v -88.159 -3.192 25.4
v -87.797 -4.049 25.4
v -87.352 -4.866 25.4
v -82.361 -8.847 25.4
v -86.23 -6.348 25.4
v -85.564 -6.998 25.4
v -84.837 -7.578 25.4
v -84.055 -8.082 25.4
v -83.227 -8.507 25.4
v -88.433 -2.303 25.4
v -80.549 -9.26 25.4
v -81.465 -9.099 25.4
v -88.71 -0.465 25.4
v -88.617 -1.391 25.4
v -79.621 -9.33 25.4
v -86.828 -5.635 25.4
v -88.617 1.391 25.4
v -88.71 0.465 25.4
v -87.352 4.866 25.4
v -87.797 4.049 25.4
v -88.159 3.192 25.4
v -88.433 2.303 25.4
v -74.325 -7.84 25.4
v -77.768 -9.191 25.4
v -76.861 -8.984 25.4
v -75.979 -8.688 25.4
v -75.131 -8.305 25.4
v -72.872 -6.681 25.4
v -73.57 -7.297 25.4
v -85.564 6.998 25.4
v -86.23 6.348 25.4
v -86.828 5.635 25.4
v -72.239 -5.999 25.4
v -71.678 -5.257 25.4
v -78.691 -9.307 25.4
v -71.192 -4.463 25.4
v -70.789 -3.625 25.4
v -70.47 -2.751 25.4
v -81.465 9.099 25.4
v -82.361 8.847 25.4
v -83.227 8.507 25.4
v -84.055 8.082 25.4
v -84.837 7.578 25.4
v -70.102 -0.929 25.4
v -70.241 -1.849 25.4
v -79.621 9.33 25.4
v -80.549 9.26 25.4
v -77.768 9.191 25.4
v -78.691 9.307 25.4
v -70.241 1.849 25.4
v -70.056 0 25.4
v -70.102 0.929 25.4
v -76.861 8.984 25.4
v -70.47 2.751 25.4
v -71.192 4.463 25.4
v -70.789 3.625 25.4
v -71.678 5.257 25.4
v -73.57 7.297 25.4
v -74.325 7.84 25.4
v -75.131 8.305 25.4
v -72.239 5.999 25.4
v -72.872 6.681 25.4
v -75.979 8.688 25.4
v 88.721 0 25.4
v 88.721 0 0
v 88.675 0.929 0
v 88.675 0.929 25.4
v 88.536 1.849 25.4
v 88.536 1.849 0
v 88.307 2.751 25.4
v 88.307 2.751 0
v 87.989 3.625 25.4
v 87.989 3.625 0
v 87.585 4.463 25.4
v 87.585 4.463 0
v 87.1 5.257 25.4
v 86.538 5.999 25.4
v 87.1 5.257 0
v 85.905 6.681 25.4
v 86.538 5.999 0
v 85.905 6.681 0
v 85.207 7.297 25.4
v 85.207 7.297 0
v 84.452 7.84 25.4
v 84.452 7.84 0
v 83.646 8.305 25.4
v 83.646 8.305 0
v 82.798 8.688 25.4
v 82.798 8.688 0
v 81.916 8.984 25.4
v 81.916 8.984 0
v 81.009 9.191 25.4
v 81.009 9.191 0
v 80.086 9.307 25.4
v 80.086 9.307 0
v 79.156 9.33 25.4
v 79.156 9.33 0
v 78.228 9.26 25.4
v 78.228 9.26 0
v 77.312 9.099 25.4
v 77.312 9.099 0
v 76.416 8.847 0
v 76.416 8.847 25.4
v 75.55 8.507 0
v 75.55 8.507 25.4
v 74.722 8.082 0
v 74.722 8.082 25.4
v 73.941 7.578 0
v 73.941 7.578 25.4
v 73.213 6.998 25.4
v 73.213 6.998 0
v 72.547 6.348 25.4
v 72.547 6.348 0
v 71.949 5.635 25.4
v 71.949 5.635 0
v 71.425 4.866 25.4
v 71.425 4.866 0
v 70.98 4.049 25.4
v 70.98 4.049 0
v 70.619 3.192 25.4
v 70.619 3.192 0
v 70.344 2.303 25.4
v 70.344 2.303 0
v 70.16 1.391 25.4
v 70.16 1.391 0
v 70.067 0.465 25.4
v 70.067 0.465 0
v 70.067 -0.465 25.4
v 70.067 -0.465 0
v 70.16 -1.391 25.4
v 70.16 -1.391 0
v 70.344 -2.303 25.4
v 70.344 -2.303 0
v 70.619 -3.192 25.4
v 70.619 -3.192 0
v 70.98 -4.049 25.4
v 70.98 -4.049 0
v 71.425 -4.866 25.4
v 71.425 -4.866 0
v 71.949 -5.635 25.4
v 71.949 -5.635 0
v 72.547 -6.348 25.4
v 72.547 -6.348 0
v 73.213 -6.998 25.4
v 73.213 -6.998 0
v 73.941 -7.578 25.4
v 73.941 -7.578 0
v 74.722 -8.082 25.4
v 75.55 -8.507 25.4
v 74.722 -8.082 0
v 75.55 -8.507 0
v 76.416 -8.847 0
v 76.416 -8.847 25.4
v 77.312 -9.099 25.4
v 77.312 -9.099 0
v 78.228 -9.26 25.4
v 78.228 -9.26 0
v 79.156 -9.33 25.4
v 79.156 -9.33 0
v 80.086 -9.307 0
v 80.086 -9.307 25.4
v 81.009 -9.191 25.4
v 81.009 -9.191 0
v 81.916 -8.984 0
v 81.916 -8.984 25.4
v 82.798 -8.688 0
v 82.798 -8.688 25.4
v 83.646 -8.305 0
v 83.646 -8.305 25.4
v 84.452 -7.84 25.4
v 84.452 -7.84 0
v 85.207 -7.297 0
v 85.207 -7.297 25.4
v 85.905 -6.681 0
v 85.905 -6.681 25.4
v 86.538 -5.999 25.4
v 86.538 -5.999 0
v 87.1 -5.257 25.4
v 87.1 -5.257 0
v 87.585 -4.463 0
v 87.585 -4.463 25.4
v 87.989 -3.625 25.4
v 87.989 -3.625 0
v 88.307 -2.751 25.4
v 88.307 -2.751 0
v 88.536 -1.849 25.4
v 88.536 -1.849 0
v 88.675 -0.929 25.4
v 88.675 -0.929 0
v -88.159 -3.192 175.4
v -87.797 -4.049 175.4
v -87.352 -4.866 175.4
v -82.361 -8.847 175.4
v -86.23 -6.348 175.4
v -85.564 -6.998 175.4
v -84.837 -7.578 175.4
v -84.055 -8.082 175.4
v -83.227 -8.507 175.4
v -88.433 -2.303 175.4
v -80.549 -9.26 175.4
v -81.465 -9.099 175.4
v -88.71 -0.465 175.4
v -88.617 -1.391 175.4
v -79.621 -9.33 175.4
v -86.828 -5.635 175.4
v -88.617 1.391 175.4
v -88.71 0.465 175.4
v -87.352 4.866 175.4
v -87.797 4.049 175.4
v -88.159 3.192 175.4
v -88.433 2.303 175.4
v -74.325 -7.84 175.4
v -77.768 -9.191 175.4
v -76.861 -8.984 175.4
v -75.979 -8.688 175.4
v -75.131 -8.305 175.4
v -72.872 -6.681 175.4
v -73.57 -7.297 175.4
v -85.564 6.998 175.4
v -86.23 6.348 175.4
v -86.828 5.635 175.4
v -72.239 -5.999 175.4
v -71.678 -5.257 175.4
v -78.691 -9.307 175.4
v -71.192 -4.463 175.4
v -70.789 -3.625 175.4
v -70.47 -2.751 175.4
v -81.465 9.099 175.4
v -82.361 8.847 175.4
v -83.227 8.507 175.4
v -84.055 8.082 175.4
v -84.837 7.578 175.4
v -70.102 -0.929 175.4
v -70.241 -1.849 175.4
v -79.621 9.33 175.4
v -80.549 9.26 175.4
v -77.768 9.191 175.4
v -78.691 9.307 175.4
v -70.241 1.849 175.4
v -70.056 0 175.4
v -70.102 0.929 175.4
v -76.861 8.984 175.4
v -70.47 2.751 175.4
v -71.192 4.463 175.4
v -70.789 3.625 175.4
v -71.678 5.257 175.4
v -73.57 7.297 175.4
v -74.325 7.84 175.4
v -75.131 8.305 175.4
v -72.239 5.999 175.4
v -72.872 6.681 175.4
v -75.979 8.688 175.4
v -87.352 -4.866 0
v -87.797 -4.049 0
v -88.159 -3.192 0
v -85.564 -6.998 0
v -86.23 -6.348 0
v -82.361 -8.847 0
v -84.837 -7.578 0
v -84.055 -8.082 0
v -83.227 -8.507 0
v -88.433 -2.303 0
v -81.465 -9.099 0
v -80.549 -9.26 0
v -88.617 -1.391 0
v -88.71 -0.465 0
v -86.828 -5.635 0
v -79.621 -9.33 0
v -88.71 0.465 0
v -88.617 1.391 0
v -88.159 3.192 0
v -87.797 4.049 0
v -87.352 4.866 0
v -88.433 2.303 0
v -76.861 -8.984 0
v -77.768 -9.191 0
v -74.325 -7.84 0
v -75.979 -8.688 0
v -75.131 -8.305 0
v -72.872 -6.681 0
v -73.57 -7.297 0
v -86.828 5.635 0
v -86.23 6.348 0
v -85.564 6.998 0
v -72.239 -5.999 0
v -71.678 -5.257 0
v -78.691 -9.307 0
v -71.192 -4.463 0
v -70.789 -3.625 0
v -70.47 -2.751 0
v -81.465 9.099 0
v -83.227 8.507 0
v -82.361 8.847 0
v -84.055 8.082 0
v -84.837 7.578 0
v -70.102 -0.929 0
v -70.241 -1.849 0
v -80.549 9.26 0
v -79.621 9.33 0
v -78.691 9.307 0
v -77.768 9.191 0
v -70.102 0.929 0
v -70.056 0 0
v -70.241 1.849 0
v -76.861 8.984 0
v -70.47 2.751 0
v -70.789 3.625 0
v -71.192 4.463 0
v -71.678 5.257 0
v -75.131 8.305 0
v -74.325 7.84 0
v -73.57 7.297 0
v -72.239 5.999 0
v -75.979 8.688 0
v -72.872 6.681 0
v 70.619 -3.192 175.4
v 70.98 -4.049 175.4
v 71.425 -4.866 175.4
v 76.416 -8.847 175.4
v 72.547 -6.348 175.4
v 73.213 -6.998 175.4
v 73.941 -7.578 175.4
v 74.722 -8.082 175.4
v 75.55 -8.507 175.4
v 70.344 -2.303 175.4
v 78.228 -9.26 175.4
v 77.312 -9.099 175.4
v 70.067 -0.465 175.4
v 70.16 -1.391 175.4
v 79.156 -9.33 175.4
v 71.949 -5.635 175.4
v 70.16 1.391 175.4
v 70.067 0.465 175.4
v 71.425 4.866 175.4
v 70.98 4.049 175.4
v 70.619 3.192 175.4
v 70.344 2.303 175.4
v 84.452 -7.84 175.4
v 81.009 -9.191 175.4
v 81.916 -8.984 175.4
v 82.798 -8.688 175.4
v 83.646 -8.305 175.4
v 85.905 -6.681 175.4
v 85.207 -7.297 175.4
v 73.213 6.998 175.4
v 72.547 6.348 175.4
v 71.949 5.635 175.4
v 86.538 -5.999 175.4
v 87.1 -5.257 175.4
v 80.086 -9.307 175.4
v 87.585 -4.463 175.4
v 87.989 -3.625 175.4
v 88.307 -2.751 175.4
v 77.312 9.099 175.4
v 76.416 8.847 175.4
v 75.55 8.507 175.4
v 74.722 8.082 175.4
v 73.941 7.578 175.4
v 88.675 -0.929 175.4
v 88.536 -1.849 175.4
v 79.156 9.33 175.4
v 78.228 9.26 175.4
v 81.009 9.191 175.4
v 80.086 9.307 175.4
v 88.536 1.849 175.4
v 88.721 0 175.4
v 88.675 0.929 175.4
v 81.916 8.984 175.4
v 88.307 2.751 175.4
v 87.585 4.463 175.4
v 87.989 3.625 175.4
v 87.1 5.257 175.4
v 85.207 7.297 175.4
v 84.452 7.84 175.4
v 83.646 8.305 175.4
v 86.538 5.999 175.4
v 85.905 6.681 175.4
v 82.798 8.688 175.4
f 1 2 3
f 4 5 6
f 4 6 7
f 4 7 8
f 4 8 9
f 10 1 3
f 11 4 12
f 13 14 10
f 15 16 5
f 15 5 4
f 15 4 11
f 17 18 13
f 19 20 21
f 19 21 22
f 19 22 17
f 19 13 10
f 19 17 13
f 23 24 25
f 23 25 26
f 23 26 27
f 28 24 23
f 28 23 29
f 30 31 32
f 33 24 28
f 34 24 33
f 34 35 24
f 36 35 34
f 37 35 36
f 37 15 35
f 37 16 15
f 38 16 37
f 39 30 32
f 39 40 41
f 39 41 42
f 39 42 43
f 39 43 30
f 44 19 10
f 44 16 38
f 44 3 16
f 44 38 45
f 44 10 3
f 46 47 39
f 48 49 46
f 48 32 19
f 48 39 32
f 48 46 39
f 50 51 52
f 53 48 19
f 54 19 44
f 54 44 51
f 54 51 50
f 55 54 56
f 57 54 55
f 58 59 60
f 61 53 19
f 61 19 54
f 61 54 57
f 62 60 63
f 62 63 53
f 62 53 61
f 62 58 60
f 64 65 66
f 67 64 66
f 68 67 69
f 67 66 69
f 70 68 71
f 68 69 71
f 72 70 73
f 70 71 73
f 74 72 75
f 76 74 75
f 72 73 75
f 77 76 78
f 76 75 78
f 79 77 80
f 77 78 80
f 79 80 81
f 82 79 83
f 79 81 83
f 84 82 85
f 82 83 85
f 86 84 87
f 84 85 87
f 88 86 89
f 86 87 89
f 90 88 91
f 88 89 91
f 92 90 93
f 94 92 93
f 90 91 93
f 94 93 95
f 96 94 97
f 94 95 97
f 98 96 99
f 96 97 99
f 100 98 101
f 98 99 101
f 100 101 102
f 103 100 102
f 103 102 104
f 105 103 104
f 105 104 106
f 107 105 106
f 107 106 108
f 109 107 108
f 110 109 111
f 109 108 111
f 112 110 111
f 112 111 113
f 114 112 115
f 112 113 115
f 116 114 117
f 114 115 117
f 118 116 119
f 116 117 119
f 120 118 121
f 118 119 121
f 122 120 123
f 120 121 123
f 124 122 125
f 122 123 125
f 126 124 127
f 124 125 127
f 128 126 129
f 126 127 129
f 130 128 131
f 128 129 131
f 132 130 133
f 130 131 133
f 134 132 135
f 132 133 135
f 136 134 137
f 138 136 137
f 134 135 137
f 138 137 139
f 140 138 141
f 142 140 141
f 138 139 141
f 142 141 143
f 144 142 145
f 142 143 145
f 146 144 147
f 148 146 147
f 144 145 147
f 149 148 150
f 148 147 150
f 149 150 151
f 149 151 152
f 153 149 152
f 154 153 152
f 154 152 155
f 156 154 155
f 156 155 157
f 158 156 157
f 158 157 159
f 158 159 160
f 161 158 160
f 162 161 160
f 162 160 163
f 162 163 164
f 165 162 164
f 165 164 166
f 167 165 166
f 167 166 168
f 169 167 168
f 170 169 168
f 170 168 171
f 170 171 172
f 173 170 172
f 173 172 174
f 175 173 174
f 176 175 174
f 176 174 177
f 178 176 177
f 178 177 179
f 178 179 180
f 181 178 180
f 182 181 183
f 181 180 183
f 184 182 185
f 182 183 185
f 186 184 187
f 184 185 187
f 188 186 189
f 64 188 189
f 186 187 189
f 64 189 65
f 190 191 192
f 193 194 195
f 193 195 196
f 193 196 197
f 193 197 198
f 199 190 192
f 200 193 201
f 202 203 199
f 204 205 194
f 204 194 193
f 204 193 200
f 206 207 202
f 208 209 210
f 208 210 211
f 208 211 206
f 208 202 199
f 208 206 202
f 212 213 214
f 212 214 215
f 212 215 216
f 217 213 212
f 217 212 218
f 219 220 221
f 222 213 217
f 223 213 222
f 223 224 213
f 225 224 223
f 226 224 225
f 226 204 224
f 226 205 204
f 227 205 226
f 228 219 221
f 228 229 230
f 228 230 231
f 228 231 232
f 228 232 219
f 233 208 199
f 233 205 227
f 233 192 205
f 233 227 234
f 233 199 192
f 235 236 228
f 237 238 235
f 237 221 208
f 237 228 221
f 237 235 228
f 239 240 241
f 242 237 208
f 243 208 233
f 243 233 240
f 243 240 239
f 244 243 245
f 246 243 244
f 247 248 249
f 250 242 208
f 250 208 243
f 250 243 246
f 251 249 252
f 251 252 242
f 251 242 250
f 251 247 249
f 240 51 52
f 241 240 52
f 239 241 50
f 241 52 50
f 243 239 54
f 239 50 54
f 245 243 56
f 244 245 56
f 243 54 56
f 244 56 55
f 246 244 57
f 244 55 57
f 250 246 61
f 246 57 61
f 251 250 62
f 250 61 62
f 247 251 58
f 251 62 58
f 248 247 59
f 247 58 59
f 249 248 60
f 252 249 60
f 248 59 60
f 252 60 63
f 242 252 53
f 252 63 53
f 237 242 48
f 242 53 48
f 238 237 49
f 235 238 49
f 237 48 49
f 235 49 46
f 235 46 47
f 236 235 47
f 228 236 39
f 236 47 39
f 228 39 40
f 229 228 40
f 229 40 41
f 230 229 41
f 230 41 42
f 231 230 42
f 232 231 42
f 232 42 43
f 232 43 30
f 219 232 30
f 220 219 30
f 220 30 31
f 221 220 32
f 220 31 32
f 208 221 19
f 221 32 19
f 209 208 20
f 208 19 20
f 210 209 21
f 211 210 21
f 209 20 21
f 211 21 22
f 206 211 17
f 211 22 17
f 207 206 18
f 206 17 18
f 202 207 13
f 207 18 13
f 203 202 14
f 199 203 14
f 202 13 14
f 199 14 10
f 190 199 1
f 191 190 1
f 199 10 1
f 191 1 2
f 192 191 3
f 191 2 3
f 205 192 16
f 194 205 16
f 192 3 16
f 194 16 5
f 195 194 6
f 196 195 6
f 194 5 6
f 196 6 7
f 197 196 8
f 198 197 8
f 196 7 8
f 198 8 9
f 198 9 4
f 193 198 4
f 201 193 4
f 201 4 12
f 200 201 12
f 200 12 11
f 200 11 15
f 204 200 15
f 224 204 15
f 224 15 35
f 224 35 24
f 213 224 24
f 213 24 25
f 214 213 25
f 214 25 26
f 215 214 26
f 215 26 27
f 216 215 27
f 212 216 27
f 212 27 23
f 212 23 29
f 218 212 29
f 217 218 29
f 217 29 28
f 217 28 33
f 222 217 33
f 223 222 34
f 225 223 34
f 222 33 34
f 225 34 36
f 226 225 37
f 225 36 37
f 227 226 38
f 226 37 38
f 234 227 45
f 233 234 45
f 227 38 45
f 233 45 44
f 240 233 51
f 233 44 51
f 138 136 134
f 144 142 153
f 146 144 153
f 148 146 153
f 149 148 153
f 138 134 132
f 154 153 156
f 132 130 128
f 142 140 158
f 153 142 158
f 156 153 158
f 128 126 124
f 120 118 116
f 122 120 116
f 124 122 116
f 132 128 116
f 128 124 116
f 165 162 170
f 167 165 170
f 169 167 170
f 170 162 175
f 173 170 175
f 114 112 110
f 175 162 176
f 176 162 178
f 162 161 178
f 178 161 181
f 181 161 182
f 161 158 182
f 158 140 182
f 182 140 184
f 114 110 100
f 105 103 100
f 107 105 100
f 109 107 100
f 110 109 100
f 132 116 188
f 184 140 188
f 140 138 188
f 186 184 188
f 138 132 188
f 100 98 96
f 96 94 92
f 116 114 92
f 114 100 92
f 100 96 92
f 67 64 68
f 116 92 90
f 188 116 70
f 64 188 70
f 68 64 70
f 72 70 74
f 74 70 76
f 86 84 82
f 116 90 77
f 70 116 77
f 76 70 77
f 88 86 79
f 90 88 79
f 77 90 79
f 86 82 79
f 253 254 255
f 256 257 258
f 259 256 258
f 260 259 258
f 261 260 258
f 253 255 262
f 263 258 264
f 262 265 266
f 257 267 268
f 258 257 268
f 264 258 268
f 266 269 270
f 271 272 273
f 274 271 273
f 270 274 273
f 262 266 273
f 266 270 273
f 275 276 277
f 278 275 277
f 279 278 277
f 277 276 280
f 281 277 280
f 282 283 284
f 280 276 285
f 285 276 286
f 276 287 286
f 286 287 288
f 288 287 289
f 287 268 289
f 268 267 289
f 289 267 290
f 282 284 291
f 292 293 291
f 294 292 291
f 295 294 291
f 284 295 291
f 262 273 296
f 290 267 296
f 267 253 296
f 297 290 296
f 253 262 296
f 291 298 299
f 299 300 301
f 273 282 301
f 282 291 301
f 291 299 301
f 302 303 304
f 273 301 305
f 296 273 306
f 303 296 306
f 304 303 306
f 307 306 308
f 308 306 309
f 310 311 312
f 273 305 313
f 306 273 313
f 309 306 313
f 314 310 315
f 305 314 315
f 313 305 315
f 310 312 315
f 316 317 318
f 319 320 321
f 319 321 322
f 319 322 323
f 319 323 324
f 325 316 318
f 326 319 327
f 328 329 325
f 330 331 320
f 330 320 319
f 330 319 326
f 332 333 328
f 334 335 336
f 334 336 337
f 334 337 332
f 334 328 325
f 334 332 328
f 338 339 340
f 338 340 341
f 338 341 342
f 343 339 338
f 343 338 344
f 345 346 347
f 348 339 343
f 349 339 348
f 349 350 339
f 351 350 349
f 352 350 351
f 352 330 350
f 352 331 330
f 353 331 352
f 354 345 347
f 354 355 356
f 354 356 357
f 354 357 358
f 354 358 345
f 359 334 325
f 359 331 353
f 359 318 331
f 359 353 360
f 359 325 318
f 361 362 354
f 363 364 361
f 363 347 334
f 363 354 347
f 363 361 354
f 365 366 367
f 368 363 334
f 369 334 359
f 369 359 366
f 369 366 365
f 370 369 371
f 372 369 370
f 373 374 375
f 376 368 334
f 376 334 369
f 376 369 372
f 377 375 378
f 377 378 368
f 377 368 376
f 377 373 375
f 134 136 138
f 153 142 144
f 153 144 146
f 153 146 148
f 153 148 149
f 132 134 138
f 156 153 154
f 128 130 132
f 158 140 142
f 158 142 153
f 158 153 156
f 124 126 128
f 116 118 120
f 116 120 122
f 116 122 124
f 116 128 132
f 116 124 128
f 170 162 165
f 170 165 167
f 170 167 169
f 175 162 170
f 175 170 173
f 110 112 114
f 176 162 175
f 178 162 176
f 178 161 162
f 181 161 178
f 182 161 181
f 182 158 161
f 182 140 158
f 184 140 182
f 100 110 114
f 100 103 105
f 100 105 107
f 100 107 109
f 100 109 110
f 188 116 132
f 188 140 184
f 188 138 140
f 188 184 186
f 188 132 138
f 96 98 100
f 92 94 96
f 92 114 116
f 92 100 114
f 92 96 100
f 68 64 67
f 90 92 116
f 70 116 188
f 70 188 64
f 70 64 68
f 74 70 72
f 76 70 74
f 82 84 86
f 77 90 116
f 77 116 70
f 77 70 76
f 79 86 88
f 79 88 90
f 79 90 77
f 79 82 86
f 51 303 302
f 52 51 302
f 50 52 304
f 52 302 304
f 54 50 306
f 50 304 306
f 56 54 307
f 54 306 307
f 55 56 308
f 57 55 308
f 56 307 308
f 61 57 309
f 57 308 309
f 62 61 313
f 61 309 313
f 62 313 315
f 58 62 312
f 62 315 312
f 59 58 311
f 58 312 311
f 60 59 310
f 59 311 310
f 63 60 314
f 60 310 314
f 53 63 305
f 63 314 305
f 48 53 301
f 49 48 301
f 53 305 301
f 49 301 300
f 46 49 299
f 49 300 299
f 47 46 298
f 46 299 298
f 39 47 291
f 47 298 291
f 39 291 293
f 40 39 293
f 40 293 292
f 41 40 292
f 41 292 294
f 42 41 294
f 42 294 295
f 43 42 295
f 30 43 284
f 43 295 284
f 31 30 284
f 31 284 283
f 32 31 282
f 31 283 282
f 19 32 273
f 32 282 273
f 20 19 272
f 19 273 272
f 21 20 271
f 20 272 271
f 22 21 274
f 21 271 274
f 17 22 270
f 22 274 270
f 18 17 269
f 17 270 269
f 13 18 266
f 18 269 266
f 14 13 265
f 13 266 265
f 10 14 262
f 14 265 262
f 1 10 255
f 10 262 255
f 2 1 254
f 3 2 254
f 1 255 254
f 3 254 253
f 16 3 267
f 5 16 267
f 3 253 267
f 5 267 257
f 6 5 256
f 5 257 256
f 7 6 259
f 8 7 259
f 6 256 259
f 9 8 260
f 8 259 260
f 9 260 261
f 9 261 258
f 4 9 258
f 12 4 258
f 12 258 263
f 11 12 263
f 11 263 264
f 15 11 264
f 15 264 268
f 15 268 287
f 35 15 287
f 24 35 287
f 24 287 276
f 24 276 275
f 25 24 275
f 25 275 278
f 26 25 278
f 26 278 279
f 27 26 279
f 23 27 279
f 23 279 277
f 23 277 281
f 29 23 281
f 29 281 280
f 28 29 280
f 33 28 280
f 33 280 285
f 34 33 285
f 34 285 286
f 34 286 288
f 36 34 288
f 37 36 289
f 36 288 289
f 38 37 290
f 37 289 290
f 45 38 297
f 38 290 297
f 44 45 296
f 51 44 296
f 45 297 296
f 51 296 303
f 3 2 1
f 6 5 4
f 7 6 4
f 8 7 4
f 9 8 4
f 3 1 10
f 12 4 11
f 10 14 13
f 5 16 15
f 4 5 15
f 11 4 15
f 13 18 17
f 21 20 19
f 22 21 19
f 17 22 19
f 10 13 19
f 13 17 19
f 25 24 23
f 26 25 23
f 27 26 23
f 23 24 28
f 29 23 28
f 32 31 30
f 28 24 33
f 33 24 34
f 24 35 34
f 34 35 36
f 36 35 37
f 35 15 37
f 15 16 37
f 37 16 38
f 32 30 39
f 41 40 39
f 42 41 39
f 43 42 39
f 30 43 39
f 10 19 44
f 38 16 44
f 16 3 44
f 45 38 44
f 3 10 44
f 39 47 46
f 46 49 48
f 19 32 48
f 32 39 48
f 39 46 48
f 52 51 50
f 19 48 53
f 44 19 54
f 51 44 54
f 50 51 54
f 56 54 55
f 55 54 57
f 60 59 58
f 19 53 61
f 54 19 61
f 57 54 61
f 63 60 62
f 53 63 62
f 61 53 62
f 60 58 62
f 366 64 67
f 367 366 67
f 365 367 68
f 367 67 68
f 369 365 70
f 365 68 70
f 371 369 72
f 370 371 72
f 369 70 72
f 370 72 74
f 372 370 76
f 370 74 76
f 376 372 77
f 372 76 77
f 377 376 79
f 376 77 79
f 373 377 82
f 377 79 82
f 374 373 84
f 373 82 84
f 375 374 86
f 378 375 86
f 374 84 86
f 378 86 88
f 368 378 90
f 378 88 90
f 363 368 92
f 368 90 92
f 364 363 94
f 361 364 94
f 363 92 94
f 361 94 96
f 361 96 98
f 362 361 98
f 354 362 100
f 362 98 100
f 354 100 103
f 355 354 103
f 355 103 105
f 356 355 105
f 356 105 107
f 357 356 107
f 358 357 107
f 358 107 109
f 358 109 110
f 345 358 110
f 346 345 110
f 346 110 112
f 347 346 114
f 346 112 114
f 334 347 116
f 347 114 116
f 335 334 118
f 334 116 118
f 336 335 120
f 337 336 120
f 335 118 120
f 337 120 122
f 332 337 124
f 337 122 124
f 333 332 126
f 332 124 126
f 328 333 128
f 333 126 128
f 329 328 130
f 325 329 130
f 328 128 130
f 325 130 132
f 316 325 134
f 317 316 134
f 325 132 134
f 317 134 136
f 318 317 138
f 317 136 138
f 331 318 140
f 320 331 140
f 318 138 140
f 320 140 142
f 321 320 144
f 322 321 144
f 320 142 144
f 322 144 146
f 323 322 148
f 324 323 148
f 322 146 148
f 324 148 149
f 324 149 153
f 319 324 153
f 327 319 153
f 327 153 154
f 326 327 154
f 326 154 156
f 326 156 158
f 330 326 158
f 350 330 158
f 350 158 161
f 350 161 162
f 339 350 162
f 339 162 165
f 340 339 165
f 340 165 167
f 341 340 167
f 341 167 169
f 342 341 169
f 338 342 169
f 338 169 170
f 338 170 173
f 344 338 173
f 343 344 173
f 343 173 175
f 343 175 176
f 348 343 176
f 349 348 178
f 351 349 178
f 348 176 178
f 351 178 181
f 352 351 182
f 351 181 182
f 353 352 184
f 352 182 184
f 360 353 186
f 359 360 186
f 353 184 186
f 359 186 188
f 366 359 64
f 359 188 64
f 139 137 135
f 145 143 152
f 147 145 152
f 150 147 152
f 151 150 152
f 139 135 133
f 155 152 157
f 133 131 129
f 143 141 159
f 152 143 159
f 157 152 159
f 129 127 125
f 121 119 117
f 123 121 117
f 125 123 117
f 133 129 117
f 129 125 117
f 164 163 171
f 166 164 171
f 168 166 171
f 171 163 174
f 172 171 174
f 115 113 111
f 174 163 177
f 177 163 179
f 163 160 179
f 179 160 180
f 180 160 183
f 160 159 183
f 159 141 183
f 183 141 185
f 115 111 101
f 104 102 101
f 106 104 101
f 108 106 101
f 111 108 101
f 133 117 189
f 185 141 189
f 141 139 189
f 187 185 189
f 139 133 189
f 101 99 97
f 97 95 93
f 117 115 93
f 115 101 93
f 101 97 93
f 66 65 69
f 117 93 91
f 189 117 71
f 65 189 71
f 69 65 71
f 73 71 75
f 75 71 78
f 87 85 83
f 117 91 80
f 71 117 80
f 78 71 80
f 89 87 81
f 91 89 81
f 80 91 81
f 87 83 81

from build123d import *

# Parameters (mm, degrees)
F0_R     = 9.3327528448
F2_DEPTH = 25.4
F3_DEPTH = 150


# Not quite as in the source:
# - the program builds the solid bodies; features that only make, move or delete a surface that nothing else refers to are left out


with BuildPart() as f2:
    # F0 (on Top) → F2 (new body)
    with BuildSketch(Plane.XY):
        with Locations((-79.3886129565, 0)):
            Circle(F0_R)
    extrude(amount=F2_DEPTH)


with BuildPart() as f2b:
    # F0 (on Top) → F2, piece 2 (new body)
    with BuildSketch(Plane.XY):
        with Locations((79.3886129565, 0)):
            Circle(F0_R)
    extrude(amount=F2_DEPTH)


with BuildPart() as f3:
    # F3 (new): a face of the model
    f3_faces = [f2.part.faces().sort_by_distance(p)[0] for p in [
        (-79.3886129565, 0, 25.4),
    ]]
    extrude(f3_faces, amount=F3_DEPTH)


with BuildPart() as f3b:
    # F3#2 (new): a face of the model
    f3_2_faces = [f2b.part.faces().sort_by_distance(p)[0] for p in [
        (79.3886129565, 0, 25.4),
    ]]
    extrude(f3_2_faces, amount=F3_DEPTH)


solid = Compound([f2.part, f2b.part, f3.part, f3b.part])
